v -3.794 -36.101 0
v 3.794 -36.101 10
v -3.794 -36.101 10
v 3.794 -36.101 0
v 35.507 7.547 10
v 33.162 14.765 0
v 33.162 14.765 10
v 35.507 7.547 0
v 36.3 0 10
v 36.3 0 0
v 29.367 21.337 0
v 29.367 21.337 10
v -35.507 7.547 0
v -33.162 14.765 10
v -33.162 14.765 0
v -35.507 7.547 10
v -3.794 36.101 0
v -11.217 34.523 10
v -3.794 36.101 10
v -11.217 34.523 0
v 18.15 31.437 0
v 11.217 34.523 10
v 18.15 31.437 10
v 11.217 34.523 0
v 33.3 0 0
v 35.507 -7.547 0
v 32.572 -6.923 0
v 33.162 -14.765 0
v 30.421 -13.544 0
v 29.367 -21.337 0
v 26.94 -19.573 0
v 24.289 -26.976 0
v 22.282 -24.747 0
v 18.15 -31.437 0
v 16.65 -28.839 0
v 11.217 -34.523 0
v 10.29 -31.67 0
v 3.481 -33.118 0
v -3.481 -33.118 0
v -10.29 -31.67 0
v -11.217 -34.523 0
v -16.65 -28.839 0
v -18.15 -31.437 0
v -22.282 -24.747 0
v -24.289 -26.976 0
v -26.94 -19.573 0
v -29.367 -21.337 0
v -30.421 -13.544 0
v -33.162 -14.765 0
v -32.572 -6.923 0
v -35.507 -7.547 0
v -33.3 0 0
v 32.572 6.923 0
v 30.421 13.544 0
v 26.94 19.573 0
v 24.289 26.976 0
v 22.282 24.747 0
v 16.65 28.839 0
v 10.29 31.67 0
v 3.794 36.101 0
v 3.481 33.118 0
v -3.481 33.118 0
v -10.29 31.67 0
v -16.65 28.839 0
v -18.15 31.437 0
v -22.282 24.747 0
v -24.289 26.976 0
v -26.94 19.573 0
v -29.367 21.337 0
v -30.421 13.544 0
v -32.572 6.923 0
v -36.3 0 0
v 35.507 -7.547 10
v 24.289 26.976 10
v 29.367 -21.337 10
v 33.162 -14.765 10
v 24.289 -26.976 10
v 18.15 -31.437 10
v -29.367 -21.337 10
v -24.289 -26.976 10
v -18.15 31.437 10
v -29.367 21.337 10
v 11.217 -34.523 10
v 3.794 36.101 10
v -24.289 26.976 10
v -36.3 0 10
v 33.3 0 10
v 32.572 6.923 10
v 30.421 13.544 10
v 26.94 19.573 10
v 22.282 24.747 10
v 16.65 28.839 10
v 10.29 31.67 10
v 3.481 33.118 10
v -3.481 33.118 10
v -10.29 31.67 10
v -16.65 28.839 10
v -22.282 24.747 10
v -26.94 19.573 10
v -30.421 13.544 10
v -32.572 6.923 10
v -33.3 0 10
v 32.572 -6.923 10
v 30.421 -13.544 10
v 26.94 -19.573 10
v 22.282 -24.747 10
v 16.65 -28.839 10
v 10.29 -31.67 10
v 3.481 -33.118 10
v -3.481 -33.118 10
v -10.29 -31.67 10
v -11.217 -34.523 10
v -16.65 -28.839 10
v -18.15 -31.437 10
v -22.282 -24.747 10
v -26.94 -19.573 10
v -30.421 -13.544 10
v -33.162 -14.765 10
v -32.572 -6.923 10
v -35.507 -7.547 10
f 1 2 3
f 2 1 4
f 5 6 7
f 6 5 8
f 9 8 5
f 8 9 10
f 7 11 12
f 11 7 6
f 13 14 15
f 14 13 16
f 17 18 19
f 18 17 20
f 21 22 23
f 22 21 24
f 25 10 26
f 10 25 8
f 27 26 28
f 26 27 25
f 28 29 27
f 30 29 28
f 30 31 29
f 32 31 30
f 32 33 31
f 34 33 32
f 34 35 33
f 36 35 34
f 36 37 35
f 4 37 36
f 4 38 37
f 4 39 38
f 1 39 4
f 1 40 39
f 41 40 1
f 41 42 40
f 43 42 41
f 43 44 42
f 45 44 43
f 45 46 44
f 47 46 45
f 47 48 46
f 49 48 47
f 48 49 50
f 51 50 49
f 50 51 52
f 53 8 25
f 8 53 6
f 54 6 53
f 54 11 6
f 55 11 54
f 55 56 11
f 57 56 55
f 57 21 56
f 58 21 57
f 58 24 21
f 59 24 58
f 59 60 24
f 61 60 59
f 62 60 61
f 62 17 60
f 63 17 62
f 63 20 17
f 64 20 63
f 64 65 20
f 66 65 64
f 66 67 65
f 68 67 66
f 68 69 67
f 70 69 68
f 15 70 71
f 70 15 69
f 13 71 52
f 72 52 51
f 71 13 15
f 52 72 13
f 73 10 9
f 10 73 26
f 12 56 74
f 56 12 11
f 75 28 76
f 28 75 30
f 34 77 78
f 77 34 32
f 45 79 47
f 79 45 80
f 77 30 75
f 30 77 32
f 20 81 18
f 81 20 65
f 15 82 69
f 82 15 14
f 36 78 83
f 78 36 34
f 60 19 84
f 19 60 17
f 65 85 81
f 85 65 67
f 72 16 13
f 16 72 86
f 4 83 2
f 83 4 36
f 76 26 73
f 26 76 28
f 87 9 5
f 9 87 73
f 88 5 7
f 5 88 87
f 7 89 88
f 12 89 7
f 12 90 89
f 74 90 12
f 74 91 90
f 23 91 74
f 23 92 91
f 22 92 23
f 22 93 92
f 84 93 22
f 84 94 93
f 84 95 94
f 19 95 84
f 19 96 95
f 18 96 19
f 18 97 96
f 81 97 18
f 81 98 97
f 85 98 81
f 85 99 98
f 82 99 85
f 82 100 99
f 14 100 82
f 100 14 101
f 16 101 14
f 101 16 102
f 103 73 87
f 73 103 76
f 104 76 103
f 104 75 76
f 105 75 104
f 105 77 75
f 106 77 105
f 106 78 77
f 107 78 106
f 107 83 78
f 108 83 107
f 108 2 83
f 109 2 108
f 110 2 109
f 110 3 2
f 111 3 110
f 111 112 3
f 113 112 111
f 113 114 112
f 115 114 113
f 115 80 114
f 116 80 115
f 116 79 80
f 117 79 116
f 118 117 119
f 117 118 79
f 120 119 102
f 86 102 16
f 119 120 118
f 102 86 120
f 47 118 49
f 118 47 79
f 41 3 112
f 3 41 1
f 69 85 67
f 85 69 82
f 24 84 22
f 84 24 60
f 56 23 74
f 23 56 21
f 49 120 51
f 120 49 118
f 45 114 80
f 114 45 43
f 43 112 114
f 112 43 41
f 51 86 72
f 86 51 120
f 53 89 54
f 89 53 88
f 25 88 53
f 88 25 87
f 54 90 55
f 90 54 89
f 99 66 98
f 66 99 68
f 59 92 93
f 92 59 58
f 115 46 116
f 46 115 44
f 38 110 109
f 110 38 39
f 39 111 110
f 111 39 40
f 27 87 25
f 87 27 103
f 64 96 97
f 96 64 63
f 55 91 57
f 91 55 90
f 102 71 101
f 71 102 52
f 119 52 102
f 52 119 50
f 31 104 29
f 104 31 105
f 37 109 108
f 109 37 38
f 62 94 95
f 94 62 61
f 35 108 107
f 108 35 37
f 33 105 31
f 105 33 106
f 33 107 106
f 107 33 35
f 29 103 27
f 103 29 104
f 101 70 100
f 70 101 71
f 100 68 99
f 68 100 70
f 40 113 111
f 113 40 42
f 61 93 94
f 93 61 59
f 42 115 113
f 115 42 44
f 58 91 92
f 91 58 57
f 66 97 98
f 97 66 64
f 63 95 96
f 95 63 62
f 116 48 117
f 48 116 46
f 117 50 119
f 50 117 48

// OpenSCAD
can_inner = 72.6;
wall_thickness_rim = 2.5 ;
can_outer = can_inner+wall_thickness_rim;

difference(){
cylinder(r=can_inner/2,h=10);
cylinder(r=can_inner/2-3,h=10);
}
